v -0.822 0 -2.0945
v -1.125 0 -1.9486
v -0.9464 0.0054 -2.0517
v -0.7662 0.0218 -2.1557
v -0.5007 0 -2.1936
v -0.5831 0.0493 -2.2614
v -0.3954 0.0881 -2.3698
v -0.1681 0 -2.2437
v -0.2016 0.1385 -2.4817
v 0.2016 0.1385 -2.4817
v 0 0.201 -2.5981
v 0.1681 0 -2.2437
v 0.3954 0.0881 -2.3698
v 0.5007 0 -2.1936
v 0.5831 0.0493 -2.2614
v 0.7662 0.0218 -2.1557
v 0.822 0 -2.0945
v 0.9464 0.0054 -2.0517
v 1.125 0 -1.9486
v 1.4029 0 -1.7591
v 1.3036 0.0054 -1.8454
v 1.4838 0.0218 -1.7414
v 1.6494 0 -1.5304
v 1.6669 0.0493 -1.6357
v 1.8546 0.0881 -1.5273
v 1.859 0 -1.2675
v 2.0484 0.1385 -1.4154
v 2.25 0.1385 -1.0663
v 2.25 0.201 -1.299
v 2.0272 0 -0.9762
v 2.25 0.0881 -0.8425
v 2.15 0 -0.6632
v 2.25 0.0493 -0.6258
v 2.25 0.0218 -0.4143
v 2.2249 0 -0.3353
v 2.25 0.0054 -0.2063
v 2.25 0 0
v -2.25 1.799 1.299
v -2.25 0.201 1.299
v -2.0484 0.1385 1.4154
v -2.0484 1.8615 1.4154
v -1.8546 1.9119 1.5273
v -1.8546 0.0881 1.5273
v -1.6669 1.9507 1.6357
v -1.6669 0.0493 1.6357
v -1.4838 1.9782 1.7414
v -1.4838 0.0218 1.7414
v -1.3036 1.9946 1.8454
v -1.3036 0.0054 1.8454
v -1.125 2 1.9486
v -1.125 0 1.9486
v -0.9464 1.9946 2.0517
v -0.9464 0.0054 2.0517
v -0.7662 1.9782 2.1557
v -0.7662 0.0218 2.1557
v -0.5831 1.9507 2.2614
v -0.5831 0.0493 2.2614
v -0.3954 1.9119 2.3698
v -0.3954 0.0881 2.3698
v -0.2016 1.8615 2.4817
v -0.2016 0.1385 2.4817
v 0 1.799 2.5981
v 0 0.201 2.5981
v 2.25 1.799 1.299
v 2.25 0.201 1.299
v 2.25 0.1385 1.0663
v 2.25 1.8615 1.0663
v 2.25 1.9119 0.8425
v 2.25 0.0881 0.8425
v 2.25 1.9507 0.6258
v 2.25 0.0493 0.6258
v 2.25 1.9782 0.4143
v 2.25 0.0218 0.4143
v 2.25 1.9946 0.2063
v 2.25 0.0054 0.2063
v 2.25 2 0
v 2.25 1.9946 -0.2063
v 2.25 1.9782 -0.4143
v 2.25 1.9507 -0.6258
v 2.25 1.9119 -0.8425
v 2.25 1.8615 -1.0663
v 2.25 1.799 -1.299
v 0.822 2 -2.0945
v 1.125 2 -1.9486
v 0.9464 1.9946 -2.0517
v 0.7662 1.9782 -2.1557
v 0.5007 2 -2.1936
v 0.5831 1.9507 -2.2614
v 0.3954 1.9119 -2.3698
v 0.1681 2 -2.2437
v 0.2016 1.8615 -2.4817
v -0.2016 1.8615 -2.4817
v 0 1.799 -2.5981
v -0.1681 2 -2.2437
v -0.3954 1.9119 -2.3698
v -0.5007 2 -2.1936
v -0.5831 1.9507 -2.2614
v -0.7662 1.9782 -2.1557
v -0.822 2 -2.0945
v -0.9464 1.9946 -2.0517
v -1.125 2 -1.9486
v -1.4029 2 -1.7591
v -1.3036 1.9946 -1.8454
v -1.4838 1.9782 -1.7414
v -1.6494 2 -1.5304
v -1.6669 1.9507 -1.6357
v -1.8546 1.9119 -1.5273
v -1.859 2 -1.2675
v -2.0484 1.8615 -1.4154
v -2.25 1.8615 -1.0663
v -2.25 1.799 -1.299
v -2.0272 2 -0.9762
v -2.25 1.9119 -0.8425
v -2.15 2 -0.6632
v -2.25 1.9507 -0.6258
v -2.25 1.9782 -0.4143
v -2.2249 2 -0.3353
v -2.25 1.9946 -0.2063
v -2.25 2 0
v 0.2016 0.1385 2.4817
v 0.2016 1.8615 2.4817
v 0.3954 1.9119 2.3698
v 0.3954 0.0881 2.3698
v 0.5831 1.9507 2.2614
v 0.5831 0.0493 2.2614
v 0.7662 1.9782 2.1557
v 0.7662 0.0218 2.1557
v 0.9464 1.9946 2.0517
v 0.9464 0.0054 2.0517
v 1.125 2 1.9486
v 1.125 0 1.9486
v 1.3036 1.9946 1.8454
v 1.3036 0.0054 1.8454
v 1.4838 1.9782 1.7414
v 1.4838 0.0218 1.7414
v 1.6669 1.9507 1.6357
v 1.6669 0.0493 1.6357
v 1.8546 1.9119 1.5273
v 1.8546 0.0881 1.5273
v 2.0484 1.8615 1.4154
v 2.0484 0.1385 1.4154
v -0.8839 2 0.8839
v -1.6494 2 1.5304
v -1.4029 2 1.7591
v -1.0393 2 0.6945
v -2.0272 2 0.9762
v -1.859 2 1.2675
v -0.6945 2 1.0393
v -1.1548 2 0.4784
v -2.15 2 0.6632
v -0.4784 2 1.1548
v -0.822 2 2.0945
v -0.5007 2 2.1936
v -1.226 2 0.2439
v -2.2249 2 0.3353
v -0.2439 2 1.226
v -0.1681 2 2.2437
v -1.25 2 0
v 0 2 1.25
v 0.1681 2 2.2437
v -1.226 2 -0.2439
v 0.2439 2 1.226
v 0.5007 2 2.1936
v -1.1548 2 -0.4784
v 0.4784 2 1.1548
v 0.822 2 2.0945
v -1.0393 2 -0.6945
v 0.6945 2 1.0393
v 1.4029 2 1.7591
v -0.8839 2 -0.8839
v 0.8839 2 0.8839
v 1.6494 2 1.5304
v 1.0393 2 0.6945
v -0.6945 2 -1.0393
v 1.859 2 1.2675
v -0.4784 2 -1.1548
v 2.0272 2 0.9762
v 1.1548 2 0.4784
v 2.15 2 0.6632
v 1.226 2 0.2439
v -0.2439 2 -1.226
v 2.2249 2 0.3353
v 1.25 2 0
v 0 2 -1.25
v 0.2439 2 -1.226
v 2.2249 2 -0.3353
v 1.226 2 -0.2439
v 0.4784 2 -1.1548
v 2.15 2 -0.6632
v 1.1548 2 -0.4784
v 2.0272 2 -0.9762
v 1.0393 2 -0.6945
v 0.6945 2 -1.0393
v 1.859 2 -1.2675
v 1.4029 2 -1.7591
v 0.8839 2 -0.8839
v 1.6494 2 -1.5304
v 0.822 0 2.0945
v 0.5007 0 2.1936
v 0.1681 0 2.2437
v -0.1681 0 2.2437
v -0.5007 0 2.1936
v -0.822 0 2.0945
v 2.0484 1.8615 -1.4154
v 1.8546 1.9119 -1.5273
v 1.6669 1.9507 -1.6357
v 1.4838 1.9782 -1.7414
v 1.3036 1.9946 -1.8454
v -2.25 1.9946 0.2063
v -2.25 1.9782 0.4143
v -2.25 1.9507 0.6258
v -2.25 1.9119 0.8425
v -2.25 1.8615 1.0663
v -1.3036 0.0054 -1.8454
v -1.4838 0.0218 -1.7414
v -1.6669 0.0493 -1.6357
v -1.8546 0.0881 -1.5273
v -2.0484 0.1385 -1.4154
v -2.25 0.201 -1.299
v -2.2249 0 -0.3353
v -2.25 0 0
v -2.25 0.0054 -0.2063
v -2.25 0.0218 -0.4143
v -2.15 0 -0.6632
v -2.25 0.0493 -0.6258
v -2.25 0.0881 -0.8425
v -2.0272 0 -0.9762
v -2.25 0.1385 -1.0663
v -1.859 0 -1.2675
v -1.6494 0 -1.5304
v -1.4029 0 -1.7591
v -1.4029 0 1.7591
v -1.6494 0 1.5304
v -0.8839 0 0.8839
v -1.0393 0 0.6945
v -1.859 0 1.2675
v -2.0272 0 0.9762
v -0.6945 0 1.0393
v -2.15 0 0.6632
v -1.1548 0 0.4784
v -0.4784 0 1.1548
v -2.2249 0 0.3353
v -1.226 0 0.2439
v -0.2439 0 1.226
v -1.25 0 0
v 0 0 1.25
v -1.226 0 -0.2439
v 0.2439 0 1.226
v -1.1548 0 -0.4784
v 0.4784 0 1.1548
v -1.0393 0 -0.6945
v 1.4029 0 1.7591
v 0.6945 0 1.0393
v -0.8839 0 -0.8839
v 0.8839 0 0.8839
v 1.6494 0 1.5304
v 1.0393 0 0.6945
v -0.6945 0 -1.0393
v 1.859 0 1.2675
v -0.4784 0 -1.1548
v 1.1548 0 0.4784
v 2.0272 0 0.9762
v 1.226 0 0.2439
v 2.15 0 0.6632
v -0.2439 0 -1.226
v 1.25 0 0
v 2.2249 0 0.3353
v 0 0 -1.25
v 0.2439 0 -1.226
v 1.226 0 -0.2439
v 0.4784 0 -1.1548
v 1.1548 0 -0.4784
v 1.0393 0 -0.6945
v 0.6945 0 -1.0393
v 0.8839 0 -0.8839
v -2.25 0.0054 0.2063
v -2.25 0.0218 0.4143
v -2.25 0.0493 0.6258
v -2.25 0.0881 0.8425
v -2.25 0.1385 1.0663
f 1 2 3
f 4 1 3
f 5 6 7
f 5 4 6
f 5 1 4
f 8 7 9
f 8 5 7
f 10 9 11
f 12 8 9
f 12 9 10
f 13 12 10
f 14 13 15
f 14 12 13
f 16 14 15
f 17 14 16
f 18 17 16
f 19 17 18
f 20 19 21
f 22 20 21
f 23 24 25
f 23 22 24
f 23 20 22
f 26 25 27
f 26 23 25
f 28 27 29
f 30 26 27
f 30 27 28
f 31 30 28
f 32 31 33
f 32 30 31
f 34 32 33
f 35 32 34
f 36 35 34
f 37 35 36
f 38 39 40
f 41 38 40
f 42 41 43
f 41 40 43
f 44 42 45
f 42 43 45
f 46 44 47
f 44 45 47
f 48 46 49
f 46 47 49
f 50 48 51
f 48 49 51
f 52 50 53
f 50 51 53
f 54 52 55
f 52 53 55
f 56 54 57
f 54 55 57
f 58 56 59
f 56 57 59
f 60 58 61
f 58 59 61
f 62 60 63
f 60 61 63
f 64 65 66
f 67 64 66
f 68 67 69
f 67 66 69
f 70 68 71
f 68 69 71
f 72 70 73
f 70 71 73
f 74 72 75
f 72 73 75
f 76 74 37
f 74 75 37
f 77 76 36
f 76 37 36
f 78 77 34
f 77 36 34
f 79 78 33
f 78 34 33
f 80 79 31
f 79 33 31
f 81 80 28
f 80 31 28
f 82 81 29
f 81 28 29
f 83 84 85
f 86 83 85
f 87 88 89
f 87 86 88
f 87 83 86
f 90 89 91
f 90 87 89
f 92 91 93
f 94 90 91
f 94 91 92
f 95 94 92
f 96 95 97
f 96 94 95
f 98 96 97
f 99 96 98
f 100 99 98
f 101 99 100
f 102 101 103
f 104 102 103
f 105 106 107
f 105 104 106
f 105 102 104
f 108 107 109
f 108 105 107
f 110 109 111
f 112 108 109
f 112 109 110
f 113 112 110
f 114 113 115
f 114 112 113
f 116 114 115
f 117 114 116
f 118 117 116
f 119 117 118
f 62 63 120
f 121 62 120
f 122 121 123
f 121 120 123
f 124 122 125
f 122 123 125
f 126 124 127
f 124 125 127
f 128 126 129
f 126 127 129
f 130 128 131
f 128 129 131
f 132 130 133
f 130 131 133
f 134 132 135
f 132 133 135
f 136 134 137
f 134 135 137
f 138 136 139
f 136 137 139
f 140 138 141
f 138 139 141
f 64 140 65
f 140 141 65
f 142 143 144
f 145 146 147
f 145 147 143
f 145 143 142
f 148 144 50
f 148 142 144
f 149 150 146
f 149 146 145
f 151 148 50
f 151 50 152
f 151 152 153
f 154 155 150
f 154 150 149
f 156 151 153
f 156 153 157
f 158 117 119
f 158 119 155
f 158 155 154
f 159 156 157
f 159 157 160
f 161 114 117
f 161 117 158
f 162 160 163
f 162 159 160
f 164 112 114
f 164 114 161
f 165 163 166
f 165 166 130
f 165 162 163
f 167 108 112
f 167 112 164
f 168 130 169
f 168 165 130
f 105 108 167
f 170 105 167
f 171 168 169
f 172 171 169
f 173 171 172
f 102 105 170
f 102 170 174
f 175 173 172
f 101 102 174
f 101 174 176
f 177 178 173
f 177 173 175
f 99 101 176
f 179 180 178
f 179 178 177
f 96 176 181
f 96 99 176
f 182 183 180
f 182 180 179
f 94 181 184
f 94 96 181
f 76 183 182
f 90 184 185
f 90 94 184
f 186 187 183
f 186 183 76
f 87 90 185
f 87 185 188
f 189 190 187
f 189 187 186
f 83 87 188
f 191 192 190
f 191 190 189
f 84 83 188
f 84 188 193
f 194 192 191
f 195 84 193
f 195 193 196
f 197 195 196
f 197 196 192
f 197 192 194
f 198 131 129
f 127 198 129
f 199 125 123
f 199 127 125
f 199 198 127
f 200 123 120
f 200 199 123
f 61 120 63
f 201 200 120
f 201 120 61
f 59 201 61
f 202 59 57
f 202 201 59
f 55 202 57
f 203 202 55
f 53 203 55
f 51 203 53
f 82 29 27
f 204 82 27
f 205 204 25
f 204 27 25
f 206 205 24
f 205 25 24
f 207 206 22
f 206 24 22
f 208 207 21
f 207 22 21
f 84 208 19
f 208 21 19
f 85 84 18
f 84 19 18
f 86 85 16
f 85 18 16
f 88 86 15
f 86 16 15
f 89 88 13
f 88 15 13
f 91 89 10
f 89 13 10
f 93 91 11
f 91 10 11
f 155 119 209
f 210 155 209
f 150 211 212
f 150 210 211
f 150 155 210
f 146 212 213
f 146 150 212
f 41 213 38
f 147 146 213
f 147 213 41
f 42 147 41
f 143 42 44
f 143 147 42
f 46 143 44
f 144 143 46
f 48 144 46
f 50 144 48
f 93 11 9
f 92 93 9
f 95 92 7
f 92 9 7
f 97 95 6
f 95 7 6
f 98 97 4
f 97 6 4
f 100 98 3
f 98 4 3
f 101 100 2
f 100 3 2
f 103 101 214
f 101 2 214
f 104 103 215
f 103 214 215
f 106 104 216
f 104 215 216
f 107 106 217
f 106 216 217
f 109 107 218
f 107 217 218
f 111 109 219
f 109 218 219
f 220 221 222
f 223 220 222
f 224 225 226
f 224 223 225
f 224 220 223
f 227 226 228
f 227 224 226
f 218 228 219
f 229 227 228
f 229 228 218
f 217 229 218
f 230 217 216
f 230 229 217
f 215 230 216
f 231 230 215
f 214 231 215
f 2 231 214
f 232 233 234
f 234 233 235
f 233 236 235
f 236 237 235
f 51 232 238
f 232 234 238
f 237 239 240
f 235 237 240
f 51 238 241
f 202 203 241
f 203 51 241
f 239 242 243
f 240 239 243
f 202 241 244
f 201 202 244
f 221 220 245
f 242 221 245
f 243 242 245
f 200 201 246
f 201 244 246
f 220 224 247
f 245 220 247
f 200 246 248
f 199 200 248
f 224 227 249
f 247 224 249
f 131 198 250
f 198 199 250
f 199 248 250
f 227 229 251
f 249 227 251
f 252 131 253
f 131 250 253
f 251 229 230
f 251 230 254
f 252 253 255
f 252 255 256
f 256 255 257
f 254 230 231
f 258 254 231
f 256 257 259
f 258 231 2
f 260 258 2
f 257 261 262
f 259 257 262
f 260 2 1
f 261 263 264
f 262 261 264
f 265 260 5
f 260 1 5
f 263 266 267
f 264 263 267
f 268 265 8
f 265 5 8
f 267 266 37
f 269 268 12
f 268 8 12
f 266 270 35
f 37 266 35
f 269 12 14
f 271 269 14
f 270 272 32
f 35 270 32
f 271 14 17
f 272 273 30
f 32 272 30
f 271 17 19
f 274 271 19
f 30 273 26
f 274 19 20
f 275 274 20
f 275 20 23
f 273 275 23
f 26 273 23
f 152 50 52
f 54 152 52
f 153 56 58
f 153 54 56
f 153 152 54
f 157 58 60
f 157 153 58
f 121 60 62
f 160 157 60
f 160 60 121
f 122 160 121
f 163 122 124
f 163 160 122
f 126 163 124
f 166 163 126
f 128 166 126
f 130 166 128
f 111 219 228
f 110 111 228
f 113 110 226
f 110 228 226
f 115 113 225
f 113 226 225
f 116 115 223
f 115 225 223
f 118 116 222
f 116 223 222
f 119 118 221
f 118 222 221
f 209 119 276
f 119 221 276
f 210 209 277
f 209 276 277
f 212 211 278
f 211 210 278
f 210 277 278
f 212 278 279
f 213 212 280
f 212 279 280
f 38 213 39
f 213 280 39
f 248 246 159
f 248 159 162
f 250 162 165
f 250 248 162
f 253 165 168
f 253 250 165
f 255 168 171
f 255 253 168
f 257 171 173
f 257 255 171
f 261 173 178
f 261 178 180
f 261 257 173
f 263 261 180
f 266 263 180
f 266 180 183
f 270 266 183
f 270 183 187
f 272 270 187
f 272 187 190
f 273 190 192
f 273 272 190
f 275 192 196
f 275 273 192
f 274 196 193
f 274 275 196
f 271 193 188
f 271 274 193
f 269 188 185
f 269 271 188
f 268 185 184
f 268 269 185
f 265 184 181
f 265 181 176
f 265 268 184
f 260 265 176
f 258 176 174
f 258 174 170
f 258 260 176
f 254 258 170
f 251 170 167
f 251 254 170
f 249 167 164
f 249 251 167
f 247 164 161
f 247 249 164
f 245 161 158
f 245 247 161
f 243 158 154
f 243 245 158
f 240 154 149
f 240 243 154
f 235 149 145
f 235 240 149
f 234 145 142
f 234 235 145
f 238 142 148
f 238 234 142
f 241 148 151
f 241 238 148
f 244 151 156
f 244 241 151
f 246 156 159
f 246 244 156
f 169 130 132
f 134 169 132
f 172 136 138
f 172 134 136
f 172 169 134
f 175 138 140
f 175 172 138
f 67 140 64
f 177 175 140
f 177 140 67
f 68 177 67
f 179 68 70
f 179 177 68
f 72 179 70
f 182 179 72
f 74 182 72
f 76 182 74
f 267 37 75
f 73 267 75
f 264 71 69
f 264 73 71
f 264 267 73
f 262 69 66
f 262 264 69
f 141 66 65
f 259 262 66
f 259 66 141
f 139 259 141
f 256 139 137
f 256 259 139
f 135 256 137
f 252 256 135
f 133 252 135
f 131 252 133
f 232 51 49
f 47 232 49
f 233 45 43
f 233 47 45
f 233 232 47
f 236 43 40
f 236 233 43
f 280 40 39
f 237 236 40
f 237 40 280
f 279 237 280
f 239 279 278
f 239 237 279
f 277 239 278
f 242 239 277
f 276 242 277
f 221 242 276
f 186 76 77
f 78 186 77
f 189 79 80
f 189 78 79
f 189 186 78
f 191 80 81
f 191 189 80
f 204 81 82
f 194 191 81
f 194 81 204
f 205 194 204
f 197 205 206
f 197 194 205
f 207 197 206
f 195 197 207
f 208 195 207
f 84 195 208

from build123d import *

# Parameters (mm, degrees)
SKETCH1_R           = 1.25
BOSS_EXTRUDE1_DEPTH = 2
SKETCH2_OUTSIDE_W   = 14.86
SKETCH2_OUTSIDE_H   = 15.556
SKETCH2_OUTSIDE_R   = 2.25
CUT_EXTRUDE1_DEPTH  = 2
CUT_EXTRUDE1_DRAFT  = -60
SKETCH3_OUTSIDE_W   = 14.86
SKETCH3_OUTSIDE_H   = 15.556
SKETCH3_OUTSIDE_R   = 2.25
CUT_EXTRUDE2_DEPTH  = 2
CUT_EXTRUDE2_DRAFT  = -60


with BuildPart() as part:
    # Sketch1 → Boss-Extrude1 (new body)
    with BuildSketch(Plane(origin=(0, 0, 0), x_dir=(1, 0, 0), z_dir=(0, 1, 0))):
        Polygon((0, 2.598076211), (-2.25, 1.299038106), (-2.25, -1.299038106), (0, -2.598076211), (2.25, -1.299038106), (2.25, 1.299038106), align=None)
        with Locations(Location((0, 0, 0), (0, 0, 270))):
            Circle(SKETCH1_R, mode=Mode.SUBTRACT)
    extrude(amount=BOSS_EXTRUDE1_DEPTH)


with BuildPart() as cut_extrude1_tool:
    # Sketch2 outside → Cut-Extrude1 (with draft: the straight prism first)
    with BuildSketch(Plane(origin=(0, 2, 0), x_dir=(1, 0, 0), z_dir=(0, 1, 0))):
        Rectangle(SKETCH2_OUTSIDE_W, SKETCH2_OUTSIDE_H)
        Circle(SKETCH2_OUTSIDE_R, mode=Mode.SUBTRACT)
    extrude(amount=-CUT_EXTRUDE1_DEPTH)
    # Cut-Extrude1: the draft: its side faces are tilted about the plane it starts from
    cut_extrude1_sides = [cut_extrude1_tool.faces().sort_by_distance(p)[0] for p in [
        (0, 1, 7.778),
        (7.43, 1, 0),
        (0, 1, -7.778),
        (-7.43, 1, 0),
        (-2.25, 1, 0),
    ]]
    draft(cut_extrude1_sides, Plane(origin=(0, 2, 0), x_dir=(1, 0, 0), z_dir=(0, 1, 0)), CUT_EXTRUDE1_DRAFT)


with BuildPart() as part_1:
    add(part.part)

    # Cut-Extrude1: cut by cut_extrude1_tool
    add(cut_extrude1_tool.part, mode=Mode.SUBTRACT)


with BuildPart() as cut_extrude2_tool:
    # Sketch3 outside → Cut-Extrude2 (with draft: the straight prism first)
    with BuildSketch(Plane.XZ):
        Rectangle(SKETCH3_OUTSIDE_W, SKETCH3_OUTSIDE_H)
        Circle(SKETCH3_OUTSIDE_R, mode=Mode.SUBTRACT)
    extrude(amount=-CUT_EXTRUDE2_DEPTH)
    # Cut-Extrude2: the draft: its side faces are tilted about the plane it starts from
    cut_extrude2_sides = [cut_extrude2_tool.faces().sort_by_distance(p)[0] for p in [
        (0, 1, -7.778),
        (7.43, 1, 0),
        (0, 1, 7.778),
        (-7.43, 1, 0),
        (-2.25, 1, 0),
    ]]
    draft(cut_extrude2_sides, Plane.XZ, CUT_EXTRUDE2_DRAFT)


with BuildPart() as part_2:
    add(part_1.part)

    # Cut-Extrude2: cut by cut_extrude2_tool
    add(cut_extrude2_tool.part, mode=Mode.SUBTRACT)


solid = part_2.part
